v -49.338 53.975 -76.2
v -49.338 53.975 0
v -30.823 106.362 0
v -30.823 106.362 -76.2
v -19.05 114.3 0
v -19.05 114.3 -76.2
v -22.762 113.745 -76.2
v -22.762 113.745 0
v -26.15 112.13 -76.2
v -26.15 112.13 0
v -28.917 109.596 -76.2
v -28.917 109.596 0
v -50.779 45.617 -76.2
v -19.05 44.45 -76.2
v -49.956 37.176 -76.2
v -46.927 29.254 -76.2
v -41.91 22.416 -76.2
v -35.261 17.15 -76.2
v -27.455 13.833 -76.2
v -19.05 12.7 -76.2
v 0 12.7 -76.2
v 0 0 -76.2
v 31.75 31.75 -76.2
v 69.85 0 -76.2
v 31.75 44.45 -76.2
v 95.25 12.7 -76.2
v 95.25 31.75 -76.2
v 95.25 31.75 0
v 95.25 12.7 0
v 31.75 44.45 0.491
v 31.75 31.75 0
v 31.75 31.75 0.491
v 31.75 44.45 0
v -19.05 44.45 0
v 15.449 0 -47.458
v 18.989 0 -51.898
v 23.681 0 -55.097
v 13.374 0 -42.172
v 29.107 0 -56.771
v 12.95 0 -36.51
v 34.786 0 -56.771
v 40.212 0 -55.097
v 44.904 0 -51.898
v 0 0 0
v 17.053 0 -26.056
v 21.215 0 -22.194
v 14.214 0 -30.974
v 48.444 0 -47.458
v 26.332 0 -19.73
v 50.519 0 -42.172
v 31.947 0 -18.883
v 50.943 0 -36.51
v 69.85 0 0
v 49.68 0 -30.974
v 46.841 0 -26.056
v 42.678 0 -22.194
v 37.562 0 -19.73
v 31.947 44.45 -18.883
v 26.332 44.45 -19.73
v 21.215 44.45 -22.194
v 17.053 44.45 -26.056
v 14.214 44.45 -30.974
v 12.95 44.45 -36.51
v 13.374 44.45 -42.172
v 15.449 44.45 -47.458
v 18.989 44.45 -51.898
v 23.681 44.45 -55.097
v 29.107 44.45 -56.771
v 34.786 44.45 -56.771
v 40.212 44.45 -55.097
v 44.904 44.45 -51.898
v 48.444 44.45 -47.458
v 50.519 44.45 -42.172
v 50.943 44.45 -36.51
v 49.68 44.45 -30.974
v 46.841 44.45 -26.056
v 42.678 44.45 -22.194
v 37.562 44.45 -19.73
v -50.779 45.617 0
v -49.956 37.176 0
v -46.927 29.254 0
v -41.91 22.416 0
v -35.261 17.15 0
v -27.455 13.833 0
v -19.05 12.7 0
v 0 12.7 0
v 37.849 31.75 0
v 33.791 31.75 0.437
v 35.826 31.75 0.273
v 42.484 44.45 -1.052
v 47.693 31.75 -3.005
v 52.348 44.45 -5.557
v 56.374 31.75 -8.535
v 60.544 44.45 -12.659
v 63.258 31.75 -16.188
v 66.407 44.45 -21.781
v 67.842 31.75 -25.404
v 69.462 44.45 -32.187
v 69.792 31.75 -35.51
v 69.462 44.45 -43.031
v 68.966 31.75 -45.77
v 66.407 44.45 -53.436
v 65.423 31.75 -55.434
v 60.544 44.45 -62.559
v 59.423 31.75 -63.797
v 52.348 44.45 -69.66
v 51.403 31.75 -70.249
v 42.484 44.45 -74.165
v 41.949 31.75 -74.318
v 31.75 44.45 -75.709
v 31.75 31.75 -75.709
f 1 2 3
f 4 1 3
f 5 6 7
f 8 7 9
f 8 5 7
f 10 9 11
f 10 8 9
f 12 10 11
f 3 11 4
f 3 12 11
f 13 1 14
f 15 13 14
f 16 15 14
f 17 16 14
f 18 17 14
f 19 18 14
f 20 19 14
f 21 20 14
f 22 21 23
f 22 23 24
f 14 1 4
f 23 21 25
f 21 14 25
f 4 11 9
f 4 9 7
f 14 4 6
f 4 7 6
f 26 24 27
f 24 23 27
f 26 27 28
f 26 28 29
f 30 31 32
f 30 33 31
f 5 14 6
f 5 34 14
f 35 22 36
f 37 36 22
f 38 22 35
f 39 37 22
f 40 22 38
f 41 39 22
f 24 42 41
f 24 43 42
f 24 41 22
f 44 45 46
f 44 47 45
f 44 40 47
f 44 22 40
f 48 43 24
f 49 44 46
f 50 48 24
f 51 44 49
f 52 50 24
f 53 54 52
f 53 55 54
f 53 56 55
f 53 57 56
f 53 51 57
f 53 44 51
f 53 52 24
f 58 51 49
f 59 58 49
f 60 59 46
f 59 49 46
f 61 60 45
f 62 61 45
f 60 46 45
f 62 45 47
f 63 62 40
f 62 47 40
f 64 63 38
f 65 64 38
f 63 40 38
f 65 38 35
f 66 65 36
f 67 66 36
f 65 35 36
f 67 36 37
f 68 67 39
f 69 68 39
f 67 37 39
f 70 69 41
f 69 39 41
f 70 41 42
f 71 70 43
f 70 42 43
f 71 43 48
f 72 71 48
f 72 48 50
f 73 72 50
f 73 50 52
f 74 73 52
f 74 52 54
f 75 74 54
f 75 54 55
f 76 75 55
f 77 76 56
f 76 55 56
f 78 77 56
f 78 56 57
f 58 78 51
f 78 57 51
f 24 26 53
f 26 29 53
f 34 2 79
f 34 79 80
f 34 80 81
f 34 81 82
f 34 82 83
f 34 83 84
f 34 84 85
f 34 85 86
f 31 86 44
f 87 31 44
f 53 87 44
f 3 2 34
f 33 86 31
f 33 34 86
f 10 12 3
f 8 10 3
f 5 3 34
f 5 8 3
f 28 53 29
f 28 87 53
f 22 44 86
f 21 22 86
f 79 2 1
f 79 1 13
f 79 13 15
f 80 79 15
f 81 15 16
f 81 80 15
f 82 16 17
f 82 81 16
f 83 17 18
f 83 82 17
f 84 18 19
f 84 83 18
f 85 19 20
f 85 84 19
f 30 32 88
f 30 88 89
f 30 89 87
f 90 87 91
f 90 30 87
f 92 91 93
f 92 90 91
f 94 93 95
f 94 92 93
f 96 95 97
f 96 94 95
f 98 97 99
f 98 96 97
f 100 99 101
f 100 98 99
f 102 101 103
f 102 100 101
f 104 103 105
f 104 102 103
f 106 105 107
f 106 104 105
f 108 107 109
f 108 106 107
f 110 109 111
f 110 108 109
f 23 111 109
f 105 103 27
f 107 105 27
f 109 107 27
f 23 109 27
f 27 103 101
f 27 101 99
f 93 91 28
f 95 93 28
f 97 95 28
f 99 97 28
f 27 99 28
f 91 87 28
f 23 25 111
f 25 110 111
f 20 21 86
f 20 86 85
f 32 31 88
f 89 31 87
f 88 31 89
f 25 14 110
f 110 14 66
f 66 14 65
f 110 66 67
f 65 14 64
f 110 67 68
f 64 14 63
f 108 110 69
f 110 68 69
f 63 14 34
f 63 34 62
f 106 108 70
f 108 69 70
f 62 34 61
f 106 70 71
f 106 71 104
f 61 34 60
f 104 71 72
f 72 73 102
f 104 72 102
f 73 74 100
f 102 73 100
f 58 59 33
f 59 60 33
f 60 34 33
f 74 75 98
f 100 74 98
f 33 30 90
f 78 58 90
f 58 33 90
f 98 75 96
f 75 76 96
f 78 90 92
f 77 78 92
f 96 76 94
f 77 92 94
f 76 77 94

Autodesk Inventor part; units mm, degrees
ref_plane "YZ Plane" through (0, 0, 0) normal (1, 0, 0) x (0, 1, 0)
ref_plane "XZ Plane" through (0, 0, 0) normal (0, 1, 0) x (-1, 0, 0)
ref_plane "XY Plane" through (0, 0, 0) normal (0, 0, 1) x (1, 0, 0)
sketch "Sketch1" plane through (0, 0, 0) normal (0, 0, 1) x (1, 0, 0)
  line L0 (0, 0) -> (69.85, 0)
  line L1 (0, 0) -> (0, 12.7)
  line L2 (95.25, 12.7) -> (69.85, 0)
  line L3 (0, 12.7) -> (-19.05, 12.7)
  line L4 (95.25, 31.75) -> (95.25, 12.7)
  line L5 (-19.05, 44.45) -> (31.75, 44.45)
  line L6 (31.75, 44.45) -> (31.75, 31.75)
  line L7 (31.75, 31.75) -> (95.25, 31.75)
  arc A0 (-48.5968, 56.0712) -> (-19.05, 12.7) centre (-19.05, 44.45) ccw
  line L8 (-19.05, 44.45) -> (-19.05, 95.25)
  line L9 (-19.05, 95.25) -> (-19.05, 101.6)
  arc A1 (-19.05, 114.3) -> (-31.2013, 105.2927) centre (-19.05, 101.6) ccw
  line L10 (-19.05, 101.6) -> (-19.05, 114.3)
  line L11 (-49.3376, 53.975) -> (-30.8232, 106.3625)
  dimension "d0" = 69.85
  dimension "d1" = 12.7
  dimension "d6" = 19.05
  dimension "d17" = 50.8
  dimension "d18" = 12.7
  dimension "d26" = 50.8
  dimension "d29" = 6.35
  dimension "d30" = 25.4
extrude "Extrusion1" add sketch "Sketch1" against normal blind 76.2 contours L1 L3 A0 L11 A1 L10 L9 L8 L5 L6 L7 L4 L2 L0
sketch "Sketch3" plane through (-19.05, 44.45, 0) normal (0, 1, 0) x (1, 0, 0)
  arc A0 (50.8, -0.4913) -> (50.8, 75.7087) centre (50.8, 37.6087) ccw
  line L0 (50.8, 75.7087) -> (50.8, -0.4913)
  line L1 (50.8, 0) -> (50.8, 76.2) projected
  point P0 (19.05, 0)
  dimension "d40" = 76.2
extrude "Extrusion2" add sketch "Sketch3" against normal up to surface (12.7 mm away)
sketch "Sketch4" plane through (-19.05, 44.45, -76.2) normal (0, 1, 0) x (1, 0, 0)
  point P0 (19.05, -76.2)
  point P1 (50.9967, -38.2666)
hole "Hole2" at (31.9467, 44.45, -37.9334) direction (0, -1, 0) diameter 38.1 end through all
properties part number "Assignment 1.7 - Hanger Jaw"
